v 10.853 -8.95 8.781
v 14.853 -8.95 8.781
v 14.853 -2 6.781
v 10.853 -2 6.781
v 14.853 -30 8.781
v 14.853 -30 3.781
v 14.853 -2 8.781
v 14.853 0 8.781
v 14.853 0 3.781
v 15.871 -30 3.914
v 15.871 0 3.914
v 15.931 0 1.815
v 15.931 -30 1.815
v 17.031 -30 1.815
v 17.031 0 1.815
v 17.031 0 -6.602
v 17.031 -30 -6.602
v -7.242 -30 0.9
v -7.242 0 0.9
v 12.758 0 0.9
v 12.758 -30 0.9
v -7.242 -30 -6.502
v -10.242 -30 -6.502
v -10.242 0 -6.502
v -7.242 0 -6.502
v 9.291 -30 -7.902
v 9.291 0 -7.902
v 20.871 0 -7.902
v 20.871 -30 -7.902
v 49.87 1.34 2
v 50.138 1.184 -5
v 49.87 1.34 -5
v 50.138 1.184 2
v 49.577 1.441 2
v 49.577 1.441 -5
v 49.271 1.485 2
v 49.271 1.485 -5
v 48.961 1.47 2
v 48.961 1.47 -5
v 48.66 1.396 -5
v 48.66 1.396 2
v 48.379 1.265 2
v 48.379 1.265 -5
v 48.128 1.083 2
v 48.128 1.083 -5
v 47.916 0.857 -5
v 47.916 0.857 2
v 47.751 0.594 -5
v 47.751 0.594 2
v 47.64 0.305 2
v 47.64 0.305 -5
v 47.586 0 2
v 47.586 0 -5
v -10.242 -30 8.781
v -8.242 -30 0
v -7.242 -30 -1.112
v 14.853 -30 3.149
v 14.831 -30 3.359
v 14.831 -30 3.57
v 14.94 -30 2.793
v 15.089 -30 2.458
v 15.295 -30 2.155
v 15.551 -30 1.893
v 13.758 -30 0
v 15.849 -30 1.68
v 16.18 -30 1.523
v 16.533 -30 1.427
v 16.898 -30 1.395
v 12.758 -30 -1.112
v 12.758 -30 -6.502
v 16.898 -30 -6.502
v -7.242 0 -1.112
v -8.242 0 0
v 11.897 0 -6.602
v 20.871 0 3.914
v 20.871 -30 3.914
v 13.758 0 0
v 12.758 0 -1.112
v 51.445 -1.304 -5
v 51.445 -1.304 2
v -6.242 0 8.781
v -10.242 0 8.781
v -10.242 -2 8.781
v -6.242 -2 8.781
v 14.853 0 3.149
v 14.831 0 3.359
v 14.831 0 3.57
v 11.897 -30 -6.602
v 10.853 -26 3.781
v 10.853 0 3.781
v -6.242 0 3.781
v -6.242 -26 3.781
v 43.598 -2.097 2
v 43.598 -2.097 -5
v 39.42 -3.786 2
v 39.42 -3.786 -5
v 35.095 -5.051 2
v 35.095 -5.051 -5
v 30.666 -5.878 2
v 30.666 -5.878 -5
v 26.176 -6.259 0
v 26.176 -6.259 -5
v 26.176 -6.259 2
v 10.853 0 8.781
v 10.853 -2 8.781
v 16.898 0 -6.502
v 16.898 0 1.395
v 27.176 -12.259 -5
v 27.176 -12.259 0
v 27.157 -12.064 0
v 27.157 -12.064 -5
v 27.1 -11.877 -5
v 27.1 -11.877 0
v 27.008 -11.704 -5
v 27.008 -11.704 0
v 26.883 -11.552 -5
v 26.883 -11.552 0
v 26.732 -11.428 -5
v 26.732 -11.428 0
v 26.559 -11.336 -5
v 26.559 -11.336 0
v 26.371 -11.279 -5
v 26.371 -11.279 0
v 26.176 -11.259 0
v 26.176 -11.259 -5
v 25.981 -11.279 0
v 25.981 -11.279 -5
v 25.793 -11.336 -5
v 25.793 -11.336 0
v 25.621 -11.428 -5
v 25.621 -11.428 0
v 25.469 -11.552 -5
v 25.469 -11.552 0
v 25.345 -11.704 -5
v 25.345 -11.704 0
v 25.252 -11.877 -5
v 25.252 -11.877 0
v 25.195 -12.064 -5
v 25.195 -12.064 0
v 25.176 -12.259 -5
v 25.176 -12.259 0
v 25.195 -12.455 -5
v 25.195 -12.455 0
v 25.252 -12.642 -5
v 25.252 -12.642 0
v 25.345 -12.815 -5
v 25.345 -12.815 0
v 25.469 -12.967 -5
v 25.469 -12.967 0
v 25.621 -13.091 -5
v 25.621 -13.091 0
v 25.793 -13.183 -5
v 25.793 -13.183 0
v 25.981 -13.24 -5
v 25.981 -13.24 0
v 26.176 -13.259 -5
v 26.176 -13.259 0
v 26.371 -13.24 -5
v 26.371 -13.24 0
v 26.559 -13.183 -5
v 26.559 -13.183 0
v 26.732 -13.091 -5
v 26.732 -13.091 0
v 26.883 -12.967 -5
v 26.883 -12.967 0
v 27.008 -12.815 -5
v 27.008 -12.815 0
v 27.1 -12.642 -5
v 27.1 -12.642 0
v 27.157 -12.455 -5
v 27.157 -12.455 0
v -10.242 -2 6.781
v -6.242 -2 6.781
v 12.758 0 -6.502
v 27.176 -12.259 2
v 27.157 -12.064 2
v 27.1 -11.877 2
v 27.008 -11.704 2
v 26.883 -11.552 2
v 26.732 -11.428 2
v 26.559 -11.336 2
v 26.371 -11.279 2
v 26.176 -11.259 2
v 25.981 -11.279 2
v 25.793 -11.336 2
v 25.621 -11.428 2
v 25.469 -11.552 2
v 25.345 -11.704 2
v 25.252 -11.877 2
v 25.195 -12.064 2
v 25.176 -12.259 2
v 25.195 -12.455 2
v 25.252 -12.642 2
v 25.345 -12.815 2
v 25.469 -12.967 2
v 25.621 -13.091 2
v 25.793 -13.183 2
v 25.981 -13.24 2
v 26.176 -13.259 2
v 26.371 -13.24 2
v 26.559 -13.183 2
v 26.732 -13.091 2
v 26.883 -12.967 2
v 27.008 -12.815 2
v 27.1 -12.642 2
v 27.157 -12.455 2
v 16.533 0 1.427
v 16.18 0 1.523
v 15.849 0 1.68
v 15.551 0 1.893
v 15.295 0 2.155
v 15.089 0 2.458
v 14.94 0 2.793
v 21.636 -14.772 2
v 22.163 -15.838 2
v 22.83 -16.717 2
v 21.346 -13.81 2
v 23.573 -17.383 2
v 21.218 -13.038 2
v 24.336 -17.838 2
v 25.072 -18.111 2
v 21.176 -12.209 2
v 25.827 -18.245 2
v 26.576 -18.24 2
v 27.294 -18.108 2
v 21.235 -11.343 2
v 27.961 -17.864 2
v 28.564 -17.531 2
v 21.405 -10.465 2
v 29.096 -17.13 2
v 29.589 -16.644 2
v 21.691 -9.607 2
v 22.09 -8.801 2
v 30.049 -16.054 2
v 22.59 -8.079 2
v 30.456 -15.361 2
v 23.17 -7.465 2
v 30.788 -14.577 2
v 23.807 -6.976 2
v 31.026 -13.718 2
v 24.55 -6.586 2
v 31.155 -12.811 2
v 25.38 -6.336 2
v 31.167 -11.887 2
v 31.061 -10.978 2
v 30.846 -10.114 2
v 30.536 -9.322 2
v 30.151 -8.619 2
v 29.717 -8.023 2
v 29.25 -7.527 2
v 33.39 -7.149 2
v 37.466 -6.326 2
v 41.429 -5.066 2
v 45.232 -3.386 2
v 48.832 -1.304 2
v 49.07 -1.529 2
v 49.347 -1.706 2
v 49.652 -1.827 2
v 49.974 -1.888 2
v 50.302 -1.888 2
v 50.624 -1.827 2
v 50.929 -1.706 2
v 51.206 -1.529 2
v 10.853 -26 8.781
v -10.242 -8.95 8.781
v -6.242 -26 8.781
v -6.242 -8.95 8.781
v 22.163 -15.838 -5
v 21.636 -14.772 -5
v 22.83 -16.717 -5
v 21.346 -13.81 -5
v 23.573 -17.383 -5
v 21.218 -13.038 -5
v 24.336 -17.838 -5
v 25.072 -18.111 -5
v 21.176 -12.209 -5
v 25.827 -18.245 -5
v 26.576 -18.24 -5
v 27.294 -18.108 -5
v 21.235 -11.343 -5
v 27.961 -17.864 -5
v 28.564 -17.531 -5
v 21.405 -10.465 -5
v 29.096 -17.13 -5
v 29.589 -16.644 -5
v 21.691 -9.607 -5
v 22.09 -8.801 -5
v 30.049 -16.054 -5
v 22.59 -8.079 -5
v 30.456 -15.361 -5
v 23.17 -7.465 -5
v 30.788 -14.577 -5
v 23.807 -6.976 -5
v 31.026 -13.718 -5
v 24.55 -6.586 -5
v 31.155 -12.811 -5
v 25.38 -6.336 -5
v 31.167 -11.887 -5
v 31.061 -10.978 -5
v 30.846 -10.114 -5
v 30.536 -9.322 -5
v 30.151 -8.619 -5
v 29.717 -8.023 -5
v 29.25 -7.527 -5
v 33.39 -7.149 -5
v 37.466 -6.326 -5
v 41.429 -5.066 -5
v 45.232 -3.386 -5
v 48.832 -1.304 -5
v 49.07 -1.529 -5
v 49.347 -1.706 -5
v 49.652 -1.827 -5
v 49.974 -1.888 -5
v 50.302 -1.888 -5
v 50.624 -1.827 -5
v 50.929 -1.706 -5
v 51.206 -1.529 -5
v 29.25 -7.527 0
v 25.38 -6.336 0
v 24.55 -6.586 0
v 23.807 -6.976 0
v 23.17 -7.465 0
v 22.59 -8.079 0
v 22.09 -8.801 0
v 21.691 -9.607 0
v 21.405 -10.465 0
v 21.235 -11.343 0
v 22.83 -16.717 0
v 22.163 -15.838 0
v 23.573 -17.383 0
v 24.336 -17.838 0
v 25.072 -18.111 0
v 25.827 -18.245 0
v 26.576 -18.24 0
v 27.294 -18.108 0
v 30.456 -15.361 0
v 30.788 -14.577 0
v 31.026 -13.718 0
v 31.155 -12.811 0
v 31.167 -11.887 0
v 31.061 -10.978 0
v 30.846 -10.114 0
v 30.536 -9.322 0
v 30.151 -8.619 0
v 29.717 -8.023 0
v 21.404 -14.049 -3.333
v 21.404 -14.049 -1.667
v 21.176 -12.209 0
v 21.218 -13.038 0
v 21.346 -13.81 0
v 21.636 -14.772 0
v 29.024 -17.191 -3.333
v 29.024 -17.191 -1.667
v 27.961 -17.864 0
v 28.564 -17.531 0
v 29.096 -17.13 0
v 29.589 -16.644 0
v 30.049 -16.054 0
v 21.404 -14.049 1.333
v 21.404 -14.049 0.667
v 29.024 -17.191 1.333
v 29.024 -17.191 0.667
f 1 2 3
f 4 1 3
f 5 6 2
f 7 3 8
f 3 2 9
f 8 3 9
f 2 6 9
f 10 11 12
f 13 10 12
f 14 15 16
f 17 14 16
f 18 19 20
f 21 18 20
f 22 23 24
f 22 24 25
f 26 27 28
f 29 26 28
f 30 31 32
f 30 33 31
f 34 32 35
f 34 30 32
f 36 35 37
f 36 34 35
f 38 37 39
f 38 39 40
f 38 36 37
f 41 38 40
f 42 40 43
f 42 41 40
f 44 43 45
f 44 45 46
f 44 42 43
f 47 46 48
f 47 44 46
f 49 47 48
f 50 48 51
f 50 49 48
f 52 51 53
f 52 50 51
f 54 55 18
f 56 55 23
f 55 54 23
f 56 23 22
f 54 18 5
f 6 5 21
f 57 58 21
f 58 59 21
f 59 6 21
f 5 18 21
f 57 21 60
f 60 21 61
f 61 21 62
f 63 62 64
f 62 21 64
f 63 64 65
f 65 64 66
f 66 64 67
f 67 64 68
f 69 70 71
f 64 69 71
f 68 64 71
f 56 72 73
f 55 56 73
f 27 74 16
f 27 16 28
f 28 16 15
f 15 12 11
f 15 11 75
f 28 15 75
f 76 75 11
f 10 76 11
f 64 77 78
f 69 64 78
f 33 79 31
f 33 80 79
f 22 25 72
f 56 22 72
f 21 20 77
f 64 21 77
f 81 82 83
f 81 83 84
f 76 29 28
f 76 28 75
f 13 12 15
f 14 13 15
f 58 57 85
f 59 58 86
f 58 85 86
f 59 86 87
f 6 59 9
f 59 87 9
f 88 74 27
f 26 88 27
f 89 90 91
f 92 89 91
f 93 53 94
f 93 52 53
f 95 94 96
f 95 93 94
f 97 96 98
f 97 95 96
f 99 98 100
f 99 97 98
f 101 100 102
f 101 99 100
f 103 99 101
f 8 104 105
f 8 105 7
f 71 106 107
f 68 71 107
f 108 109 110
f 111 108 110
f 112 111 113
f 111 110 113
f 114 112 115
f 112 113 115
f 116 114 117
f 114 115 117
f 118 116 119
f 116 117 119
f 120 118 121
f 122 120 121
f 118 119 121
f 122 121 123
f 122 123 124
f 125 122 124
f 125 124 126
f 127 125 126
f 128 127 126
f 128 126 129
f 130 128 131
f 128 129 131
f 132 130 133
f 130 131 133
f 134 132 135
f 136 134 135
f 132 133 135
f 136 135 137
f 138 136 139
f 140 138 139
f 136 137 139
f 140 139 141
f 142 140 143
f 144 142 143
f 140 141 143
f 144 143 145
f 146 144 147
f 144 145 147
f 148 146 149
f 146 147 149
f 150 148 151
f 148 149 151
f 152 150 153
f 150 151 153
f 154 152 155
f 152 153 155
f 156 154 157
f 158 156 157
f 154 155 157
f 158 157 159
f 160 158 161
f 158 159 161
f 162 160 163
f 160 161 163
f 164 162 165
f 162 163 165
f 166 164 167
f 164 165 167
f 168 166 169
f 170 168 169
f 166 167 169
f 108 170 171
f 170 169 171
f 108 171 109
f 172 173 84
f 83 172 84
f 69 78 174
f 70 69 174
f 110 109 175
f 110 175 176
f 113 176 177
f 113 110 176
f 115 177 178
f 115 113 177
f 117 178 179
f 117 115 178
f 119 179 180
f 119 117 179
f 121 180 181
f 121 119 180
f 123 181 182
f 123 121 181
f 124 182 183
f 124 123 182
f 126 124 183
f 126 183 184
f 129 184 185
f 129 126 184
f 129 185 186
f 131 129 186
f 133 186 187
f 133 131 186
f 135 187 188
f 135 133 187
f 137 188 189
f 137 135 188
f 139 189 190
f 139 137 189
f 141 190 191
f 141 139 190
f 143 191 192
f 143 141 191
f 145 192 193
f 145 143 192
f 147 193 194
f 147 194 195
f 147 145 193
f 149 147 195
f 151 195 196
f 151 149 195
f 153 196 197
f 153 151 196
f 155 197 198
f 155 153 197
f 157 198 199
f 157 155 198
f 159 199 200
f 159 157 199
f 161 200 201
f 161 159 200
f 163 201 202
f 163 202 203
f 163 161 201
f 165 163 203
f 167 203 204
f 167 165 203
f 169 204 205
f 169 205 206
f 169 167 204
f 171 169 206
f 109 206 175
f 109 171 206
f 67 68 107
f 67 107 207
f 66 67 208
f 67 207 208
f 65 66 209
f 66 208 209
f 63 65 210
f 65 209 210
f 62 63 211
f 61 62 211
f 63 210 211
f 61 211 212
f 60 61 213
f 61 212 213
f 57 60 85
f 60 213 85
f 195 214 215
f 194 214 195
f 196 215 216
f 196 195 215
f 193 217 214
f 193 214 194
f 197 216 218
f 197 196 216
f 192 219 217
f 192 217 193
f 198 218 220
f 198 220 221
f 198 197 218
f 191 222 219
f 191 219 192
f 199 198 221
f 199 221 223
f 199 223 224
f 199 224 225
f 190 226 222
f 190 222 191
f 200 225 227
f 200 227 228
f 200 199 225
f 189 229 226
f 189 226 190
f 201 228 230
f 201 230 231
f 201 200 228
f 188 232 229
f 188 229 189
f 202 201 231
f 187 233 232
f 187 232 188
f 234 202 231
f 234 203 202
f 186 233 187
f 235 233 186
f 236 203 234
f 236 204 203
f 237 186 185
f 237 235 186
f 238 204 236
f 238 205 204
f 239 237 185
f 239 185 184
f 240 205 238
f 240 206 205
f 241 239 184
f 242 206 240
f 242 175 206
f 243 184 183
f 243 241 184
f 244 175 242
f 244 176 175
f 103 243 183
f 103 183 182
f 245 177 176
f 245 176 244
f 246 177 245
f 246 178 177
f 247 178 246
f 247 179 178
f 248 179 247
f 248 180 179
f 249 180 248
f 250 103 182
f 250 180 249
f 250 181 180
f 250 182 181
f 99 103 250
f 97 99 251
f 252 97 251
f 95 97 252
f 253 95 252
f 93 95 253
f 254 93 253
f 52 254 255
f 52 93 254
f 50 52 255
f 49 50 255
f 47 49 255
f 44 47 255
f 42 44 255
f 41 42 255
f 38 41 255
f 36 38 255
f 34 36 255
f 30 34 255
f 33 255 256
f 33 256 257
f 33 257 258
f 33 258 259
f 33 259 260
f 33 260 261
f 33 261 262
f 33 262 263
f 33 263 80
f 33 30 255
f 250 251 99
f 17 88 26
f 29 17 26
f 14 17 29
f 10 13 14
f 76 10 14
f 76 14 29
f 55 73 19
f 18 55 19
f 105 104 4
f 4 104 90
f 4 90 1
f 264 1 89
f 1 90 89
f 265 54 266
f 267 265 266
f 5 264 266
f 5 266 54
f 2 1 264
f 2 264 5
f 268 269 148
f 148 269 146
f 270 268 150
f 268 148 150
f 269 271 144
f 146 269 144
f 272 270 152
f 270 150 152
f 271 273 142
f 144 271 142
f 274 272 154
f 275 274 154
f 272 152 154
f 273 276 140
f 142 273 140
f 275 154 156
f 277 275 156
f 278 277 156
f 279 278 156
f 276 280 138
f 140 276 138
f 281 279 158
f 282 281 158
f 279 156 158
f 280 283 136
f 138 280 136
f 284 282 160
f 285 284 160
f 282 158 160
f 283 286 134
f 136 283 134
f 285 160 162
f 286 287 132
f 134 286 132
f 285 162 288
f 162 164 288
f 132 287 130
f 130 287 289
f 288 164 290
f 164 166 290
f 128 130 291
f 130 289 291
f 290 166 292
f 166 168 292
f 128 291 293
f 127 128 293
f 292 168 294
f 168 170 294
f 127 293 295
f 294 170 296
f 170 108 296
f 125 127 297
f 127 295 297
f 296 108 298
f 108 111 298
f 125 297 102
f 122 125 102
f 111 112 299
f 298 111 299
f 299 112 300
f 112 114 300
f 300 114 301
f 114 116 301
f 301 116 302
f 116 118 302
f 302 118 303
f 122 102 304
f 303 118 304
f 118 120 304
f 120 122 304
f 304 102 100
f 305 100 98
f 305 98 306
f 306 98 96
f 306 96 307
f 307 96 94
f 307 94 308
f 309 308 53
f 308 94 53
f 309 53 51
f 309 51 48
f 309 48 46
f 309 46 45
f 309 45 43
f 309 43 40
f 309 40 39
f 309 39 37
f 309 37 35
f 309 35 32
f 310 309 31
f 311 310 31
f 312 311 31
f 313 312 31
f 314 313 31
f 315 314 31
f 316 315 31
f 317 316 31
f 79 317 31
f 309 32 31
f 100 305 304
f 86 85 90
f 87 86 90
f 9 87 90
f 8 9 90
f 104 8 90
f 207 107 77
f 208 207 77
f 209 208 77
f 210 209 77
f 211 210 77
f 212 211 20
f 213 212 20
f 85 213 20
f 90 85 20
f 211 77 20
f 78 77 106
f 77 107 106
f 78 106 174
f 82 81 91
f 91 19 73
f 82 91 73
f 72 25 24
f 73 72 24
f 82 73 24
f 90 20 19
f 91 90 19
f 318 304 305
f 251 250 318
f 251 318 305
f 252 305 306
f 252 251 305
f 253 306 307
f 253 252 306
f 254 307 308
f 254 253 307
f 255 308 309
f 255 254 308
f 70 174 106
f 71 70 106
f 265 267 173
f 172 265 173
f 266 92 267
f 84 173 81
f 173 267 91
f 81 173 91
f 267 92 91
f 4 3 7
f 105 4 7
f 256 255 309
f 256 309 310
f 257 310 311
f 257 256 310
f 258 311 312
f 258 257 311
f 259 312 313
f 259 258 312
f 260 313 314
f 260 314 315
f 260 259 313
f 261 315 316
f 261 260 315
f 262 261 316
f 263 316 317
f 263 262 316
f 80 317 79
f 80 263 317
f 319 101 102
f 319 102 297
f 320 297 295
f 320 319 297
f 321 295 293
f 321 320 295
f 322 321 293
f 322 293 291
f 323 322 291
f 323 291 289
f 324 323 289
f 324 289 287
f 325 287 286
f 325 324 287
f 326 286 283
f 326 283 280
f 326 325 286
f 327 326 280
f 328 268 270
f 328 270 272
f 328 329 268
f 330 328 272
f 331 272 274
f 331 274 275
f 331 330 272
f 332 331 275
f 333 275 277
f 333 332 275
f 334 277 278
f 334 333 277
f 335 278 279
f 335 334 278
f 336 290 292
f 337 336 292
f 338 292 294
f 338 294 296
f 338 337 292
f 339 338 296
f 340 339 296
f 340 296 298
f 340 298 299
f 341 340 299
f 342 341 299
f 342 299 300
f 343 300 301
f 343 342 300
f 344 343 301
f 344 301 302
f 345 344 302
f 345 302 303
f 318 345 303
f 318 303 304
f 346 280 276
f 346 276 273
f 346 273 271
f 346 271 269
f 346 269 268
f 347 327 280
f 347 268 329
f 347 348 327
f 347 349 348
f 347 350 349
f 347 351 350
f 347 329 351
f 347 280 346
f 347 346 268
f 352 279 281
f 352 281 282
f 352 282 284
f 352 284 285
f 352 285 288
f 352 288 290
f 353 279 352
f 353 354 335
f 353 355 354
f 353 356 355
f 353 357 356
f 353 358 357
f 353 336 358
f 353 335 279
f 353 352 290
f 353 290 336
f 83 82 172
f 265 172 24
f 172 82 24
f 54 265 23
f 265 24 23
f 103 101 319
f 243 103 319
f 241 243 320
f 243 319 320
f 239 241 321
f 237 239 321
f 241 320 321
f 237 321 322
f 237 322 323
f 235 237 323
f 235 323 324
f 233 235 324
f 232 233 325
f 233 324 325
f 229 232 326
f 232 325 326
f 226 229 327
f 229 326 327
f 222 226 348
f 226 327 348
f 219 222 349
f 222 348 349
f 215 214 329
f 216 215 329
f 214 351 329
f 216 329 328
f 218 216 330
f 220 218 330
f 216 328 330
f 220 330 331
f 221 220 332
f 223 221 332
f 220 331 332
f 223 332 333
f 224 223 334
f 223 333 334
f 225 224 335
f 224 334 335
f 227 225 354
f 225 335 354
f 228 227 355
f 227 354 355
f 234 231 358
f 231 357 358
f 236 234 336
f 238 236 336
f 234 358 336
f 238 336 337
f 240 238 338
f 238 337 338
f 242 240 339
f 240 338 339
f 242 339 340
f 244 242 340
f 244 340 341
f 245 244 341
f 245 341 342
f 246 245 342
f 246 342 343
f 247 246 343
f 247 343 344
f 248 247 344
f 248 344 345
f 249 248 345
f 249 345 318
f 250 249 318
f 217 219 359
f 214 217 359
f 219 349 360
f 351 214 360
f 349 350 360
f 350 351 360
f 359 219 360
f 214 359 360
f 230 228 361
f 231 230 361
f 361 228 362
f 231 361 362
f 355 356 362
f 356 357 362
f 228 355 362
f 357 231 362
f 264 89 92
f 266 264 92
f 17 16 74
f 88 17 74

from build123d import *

# Parameters (mm, degrees)
F1_DEPTH      = 30
F2_R          = 1
F3_DEPTH      = 2
F3_DEPTH_BACK = 5
F5_DEPTH      = 5
F7_DEPTH      = 40
F7_DEPTH_BACK = 25


with BuildPart() as f1:
    # F0 (on Front) → F1 (new body)
    with BuildSketch(Plane.XZ):
        with BuildLine():
            Line((14.8527094555, 3.780583021), (-10.2424963421, 3.780583021))
            Line((-10.2424963421, 3.780583021), (-10.2424963421, -6.5018421061))
            Line((-10.2424963421, -6.5018421061), (-7.2424963421, -6.5018421061))
            Line((-7.2424963421, -6.5018421061), (-7.2424963421, -1.1115048688))
            Line((-7.2424963421, -1.1115048688), (-8.2424963421, 0))
            Line((-8.2424963421, 0), (-7.2424963421, 0.8996811692))
            Line((-7.2424963421, 0.8996811692), (12.7575036579, 0.8996811692))
            Line((12.7575036579, 0.8996811692), (13.7575036579, 0))
            Line((13.7575036579, 0), (12.7575036579, -1.1115048688))
            Line((12.7575036579, -1.1115048688), (12.7575036579, -6.5018421061))
            Line((12.7575036579, -6.5018421061), (16.8982353061, -6.5018421061))
            Line((16.8982353061, -6.5018421061), (16.8982353061, 1.3947577681))
            ThreePointArc((16.8982353061, 1.3947577681), (15.5510283365, 1.8932206333), (14.8527094555, 3.1485224248))
            ThreePointArc((14.8527094555, 3.1485224248), (14.8284403514, 3.4645527229), (14.8527094555, 3.780583021))
        make_face()
    extrude(amount=F1_DEPTH)

    # F4 (on face) → F5 (join)
    with BuildSketch(Plane.XY.offset(3.780583021)):
        Polygon((-6.2424963421, 0), (-10.2424963421, 0), (-10.2424963421, -26), (-10.2424963421, -30), (-6.2424963421, -30), (10.8527094555, -30), (14.8527094555, -30), (14.8527094555, -26), (14.8527094555, 0), (10.8527094555, 0), (10.8527094555, -26), (-6.2424963421, -26), align=None)
    extrude(amount=F5_DEPTH)

    # F6 (on face) → F7 (cut, two sides)
    with BuildSketch(Plane.YZ.offset(14.8527094555)) as f7_sk:
        Polygon((-2, 6.780583021), (-2, 8.780583021), (-2.450104937, 8.780583021), (-8.950104937, 8.780583021), align=None)
    extrude(amount=-F7_DEPTH, mode=Mode.SUBTRACT)
    extrude(f7_sk.sketch, amount=F7_DEPTH_BACK, mode=Mode.SUBTRACT)


with BuildPart() as f1b:
    # F0 (on Front) → F1, piece 2 (new body)
    with BuildSketch(Plane.XZ):
        Polygon((11.8966108242, -6.6018421061), (9.2910254428, -7.9018421061), (20.8707033843, -7.9018421061), (20.8707033843, 3.9137848653), (15.8707033843, 3.9137848653), (15.931197069, 1.8146563523), (17.031197069, 1.8146563523), (17.031197069, -6.6018421061), align=None)
    extrude(amount=F1_DEPTH)


with BuildPart() as f3:
    # F2 (on Top) → F3 (new body, two sides)
    with BuildSketch(Plane.XY) as f3_sk:
        with BuildLine():
            ThreePointArc((47.585811466, 0), (37.2734979985, -4.4723012943), (26.1761434376, -6.2594805434))
            add(Edge.make_bspline(
                [(26.1761434376, -6.2594805434), (19.3747874707, -6.2594805434), (21.4038275676, -14.0494531079), (23.4328676646, -21.8394256723), (29.0235815963, -17.1914799496), (34.614295528, -12.543534227), (29.2495139133, -7.5267934374)],
                knots=[0, 0, 0, 1.8737375275, 1.8737375275, 3.747475055, 3.747475055, 5.6212125825, 5.6212125825, 5.6212125825], degree=2, weights=[1, 0.5923137848, 1, 0.5923137848, 1, 0.5923137848, 1]))
            ThreePointArc((29.2495139133, -7.5267934374), (39.4645791019, -5.7497530376), (48.8316376838, -1.3041211464))
            ThreePointArc((48.8316376838, -1.3041211464), (50.1380822228, -1.8961829102), (51.4445267618, -1.3041211464))
            Line((51.4445267618, -1.3041211464), (50.1380822228, 1.1837984202))
            ThreePointArc((50.1380822228, 1.1837984202), (48.5162697127, 1.3371795039), (47.585811466, 0))
        make_face()
        with Locations((26.1761434376, -12.2594805434)):
            Circle(F2_R, mode=Mode.SUBTRACT)
    extrude(amount=F3_DEPTH)
    extrude(f3_sk.sketch, amount=-F3_DEPTH_BACK)


solid = Compound([f1.part, f1b.part, f3.part])
